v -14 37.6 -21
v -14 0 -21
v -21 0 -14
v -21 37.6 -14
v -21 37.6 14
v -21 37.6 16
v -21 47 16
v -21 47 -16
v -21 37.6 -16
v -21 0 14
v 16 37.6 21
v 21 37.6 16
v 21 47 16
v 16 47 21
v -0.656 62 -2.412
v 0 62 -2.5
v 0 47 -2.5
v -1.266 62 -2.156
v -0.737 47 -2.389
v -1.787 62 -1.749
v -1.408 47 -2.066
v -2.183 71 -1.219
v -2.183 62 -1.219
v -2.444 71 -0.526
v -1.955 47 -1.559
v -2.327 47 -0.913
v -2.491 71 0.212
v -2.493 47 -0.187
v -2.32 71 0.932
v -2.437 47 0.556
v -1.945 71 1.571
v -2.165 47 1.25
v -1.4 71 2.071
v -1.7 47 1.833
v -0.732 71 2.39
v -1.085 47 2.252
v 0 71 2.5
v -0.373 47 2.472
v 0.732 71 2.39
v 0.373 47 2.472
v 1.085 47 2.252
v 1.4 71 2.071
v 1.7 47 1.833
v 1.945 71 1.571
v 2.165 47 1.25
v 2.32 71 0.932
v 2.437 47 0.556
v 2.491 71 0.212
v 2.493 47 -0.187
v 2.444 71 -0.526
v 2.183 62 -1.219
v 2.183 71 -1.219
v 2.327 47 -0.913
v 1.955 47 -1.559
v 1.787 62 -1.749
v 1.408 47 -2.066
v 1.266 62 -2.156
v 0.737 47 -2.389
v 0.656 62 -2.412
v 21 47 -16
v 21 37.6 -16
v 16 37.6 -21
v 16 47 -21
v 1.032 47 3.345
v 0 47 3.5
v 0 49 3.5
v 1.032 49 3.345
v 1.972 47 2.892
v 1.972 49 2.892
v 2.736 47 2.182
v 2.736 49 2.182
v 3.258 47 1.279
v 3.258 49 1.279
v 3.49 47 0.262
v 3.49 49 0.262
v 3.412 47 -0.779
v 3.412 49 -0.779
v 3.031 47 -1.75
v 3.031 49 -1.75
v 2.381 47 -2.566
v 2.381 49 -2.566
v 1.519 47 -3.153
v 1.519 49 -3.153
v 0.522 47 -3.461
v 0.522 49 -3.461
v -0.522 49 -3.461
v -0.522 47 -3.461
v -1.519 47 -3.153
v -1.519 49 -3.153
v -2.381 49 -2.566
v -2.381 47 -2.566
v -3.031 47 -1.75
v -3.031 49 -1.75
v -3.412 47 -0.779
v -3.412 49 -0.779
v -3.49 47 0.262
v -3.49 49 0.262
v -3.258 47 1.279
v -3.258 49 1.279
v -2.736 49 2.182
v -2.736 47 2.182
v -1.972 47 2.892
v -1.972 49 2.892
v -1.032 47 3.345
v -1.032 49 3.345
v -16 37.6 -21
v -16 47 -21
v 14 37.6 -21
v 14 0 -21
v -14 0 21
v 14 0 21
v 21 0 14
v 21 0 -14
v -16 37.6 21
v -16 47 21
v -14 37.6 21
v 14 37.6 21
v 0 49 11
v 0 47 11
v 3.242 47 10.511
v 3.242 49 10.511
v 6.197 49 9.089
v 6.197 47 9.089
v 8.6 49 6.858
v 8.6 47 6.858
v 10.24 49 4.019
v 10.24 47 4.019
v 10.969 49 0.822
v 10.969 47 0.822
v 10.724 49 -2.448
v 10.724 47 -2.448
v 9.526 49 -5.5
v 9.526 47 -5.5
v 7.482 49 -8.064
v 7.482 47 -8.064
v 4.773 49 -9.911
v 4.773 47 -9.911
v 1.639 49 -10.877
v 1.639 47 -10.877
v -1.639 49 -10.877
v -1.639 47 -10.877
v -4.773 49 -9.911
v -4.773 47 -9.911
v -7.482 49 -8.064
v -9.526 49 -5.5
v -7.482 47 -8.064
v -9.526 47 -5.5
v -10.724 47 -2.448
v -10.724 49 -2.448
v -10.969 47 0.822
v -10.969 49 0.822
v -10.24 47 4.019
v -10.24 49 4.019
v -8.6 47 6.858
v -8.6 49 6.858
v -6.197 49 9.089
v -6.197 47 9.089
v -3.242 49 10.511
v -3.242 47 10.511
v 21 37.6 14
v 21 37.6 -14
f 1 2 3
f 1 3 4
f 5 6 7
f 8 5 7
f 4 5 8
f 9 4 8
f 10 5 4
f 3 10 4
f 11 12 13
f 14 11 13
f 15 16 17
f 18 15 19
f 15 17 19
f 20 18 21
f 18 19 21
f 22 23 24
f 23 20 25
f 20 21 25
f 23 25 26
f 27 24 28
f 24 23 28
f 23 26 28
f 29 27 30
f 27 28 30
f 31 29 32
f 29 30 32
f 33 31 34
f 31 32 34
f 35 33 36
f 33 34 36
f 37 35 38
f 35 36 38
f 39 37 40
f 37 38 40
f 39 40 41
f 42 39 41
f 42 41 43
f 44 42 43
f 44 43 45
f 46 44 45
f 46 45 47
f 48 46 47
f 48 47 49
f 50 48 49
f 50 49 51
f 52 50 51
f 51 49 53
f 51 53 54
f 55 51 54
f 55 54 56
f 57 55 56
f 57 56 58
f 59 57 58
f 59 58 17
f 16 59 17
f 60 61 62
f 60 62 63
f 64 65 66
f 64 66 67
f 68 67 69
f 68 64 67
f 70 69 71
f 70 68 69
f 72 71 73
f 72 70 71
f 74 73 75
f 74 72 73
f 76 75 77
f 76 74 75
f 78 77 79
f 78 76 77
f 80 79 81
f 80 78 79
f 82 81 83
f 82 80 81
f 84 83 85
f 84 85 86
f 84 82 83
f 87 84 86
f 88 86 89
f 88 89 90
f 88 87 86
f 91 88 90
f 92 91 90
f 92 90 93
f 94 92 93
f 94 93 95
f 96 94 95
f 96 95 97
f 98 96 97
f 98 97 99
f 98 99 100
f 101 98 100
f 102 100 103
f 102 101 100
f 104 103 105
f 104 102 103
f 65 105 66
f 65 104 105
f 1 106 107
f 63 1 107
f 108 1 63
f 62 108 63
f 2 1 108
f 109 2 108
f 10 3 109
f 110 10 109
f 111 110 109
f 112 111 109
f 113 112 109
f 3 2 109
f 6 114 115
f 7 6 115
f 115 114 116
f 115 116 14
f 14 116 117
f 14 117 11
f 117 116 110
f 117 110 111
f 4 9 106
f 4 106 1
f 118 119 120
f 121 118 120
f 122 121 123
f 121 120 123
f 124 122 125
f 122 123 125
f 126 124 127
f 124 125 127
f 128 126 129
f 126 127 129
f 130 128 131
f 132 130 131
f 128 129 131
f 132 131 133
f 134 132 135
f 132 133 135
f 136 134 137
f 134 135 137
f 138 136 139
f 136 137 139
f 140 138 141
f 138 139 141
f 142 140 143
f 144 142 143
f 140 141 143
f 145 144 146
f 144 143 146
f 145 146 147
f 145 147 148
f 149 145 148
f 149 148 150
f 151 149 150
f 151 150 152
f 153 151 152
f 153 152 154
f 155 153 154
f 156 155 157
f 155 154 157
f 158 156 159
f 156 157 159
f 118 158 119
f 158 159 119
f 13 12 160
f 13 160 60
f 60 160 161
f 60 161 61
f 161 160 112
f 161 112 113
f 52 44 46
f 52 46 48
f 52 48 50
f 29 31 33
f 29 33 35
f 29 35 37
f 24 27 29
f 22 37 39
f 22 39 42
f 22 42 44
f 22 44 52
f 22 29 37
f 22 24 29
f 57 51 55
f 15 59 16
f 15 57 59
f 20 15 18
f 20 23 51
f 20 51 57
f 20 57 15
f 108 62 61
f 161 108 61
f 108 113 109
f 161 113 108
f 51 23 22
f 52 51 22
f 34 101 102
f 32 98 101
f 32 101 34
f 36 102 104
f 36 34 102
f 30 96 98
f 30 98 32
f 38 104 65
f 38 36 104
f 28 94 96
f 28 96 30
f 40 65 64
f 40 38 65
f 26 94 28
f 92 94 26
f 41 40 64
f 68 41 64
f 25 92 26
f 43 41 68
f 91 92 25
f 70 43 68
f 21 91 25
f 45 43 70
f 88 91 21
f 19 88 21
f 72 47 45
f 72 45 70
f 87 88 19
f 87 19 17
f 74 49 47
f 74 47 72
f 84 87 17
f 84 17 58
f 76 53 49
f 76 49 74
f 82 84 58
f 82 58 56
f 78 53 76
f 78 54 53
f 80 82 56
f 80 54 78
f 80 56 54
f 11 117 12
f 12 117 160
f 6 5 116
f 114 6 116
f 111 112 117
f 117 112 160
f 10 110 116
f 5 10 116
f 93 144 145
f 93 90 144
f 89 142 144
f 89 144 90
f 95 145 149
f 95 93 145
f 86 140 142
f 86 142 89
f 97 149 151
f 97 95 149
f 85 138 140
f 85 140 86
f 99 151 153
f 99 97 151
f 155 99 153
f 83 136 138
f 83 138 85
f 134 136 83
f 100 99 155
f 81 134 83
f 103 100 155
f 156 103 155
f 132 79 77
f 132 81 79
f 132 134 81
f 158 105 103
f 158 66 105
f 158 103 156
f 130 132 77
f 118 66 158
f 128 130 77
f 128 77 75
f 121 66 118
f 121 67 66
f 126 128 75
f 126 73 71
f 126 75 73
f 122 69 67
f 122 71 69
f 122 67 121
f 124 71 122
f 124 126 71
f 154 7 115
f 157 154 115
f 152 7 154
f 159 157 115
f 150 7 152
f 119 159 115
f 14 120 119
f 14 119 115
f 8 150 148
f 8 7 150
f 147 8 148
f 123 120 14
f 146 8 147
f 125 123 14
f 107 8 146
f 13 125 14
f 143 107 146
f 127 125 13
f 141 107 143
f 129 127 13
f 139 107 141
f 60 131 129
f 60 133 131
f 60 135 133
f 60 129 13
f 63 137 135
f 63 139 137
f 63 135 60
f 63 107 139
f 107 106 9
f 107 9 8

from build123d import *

# Parameters (mm, degrees)
SKETCH4_W               = 42
SKETCH4_H               = 42
BOTTOM_DEPTH            = 9.4
CHAMFER2_SIZE           = 5
SKETCH6_W               = 42
SKETCH6_H               = 42
MIDDLE_DEPTH            = 28.2
CHAMFER3_SIZE           = 7
SKETCH8_W               = 42
SKETCH8_H               = 42
TOP_DEPTH               = 9.4
CHAMFER4_SIZE           = 5
SKETCH9_R               = 11
SKETCH9_R_2             = 3.5
BOSS_EXTRUDE4_DEPTH     = 2
SKETCH10_R              = 2.5
SHAFT_DEPTH             = 24
CUT_EXTRUDE3_DEPTH      = 5
CUT_EXTRUDE3_DEPTH_BACK = 5
SKETCH11_W              = 2.239647547
SKETCH11_H              = 11.242457261


with BuildPart() as part:
    # Sketch4 → Bottom (new body)
    with BuildSketch(Plane(origin=(0, 0, 0), x_dir=(1, 0, 0), z_dir=(0, 1, 0))):
        Rectangle(SKETCH4_W, SKETCH4_H)
    extrude(amount=BOTTOM_DEPTH)

    # Chamfer2
    chamfer2_edges = [part.edges().sort_by_distance(p)[0] for p in [
        (-21, 4.7, 21),
        (-21, 4.7, -21),
        (21, 4.7, -21),
        (21, 4.7, 21),
    ]]
    chamfer(chamfer2_edges, length=CHAMFER2_SIZE)

    # Sketch6 → Middle (add)
    with BuildSketch(Plane(origin=(0, 9.4, 0), x_dir=(1, 0, 0), z_dir=(0, 1, 0))):
        Rectangle(SKETCH6_W, SKETCH6_H)
    extrude(amount=MIDDLE_DEPTH)

    # Chamfer3
    chamfer3_edges = [part.edges().sort_by_distance(p)[0] for p in [
        (21, 23.5, 21),
        (-21, 23.5, 21),
        (-21, 23.5, -21),
        (21, 23.5, -21),
    ]]
    chamfer(chamfer3_edges, length=CHAMFER3_SIZE)

    # Sketch8 → Top (add)
    with BuildSketch(Plane(origin=(0, 37.6, 0), x_dir=(1, 0, 0), z_dir=(0, 1, 0))):
        Rectangle(SKETCH8_W, SKETCH8_H)
    extrude(amount=TOP_DEPTH)

    # Chamfer4
    chamfer4_edges = [part.edges().sort_by_distance(p)[0] for p in [
        (21, 42.3, 21),
        (21, 42.3, -21),
        (-21, 42.3, -21),
        (-21, 42.3, 21),
    ]]
    chamfer(chamfer4_edges, length=CHAMFER4_SIZE)

    # Sketch9 → Boss-Extrude4 (add)
    with BuildSketch(Plane(origin=(0, 47, 0), x_dir=(1, 0, 0), z_dir=(0, 1, 0))):
        with Locations(Location((0, 0, 0), (0, 0, 270))):
            Circle(SKETCH9_R)
        with Locations(Location((0, 0, 0), (0, 0, 270))):
            Circle(SKETCH9_R_2, mode=Mode.SUBTRACT)
    extrude(amount=BOSS_EXTRUDE4_DEPTH)

    # Sketch10 → Shaft (add)
    with BuildSketch(Plane(origin=(0, 47, 0), x_dir=(1, 0, 0), z_dir=(0, 1, 0))):
        with Locations(Location((0, 0, 0), (0, 0, 90))):
            Circle(SKETCH10_R)
    extrude(amount=SHAFT_DEPTH)

    # Sketch11 → Cut-Extrude3 (cut, two sides: drawn at the far end of the back side and taken through both)
    with BuildSketch(Plane(origin=(0, 0, 0), x_dir=(0, 0, -1), z_dir=(1, 0, 0)).offset(-CUT_EXTRUDE3_DEPTH_BACK)):
        with Locations((2.338622492, 67.62122863)):
            Rectangle(SKETCH11_W, SKETCH11_H)
    extrude(amount=CUT_EXTRUDE3_DEPTH + CUT_EXTRUDE3_DEPTH_BACK, mode=Mode.SUBTRACT)


solid = part.part
